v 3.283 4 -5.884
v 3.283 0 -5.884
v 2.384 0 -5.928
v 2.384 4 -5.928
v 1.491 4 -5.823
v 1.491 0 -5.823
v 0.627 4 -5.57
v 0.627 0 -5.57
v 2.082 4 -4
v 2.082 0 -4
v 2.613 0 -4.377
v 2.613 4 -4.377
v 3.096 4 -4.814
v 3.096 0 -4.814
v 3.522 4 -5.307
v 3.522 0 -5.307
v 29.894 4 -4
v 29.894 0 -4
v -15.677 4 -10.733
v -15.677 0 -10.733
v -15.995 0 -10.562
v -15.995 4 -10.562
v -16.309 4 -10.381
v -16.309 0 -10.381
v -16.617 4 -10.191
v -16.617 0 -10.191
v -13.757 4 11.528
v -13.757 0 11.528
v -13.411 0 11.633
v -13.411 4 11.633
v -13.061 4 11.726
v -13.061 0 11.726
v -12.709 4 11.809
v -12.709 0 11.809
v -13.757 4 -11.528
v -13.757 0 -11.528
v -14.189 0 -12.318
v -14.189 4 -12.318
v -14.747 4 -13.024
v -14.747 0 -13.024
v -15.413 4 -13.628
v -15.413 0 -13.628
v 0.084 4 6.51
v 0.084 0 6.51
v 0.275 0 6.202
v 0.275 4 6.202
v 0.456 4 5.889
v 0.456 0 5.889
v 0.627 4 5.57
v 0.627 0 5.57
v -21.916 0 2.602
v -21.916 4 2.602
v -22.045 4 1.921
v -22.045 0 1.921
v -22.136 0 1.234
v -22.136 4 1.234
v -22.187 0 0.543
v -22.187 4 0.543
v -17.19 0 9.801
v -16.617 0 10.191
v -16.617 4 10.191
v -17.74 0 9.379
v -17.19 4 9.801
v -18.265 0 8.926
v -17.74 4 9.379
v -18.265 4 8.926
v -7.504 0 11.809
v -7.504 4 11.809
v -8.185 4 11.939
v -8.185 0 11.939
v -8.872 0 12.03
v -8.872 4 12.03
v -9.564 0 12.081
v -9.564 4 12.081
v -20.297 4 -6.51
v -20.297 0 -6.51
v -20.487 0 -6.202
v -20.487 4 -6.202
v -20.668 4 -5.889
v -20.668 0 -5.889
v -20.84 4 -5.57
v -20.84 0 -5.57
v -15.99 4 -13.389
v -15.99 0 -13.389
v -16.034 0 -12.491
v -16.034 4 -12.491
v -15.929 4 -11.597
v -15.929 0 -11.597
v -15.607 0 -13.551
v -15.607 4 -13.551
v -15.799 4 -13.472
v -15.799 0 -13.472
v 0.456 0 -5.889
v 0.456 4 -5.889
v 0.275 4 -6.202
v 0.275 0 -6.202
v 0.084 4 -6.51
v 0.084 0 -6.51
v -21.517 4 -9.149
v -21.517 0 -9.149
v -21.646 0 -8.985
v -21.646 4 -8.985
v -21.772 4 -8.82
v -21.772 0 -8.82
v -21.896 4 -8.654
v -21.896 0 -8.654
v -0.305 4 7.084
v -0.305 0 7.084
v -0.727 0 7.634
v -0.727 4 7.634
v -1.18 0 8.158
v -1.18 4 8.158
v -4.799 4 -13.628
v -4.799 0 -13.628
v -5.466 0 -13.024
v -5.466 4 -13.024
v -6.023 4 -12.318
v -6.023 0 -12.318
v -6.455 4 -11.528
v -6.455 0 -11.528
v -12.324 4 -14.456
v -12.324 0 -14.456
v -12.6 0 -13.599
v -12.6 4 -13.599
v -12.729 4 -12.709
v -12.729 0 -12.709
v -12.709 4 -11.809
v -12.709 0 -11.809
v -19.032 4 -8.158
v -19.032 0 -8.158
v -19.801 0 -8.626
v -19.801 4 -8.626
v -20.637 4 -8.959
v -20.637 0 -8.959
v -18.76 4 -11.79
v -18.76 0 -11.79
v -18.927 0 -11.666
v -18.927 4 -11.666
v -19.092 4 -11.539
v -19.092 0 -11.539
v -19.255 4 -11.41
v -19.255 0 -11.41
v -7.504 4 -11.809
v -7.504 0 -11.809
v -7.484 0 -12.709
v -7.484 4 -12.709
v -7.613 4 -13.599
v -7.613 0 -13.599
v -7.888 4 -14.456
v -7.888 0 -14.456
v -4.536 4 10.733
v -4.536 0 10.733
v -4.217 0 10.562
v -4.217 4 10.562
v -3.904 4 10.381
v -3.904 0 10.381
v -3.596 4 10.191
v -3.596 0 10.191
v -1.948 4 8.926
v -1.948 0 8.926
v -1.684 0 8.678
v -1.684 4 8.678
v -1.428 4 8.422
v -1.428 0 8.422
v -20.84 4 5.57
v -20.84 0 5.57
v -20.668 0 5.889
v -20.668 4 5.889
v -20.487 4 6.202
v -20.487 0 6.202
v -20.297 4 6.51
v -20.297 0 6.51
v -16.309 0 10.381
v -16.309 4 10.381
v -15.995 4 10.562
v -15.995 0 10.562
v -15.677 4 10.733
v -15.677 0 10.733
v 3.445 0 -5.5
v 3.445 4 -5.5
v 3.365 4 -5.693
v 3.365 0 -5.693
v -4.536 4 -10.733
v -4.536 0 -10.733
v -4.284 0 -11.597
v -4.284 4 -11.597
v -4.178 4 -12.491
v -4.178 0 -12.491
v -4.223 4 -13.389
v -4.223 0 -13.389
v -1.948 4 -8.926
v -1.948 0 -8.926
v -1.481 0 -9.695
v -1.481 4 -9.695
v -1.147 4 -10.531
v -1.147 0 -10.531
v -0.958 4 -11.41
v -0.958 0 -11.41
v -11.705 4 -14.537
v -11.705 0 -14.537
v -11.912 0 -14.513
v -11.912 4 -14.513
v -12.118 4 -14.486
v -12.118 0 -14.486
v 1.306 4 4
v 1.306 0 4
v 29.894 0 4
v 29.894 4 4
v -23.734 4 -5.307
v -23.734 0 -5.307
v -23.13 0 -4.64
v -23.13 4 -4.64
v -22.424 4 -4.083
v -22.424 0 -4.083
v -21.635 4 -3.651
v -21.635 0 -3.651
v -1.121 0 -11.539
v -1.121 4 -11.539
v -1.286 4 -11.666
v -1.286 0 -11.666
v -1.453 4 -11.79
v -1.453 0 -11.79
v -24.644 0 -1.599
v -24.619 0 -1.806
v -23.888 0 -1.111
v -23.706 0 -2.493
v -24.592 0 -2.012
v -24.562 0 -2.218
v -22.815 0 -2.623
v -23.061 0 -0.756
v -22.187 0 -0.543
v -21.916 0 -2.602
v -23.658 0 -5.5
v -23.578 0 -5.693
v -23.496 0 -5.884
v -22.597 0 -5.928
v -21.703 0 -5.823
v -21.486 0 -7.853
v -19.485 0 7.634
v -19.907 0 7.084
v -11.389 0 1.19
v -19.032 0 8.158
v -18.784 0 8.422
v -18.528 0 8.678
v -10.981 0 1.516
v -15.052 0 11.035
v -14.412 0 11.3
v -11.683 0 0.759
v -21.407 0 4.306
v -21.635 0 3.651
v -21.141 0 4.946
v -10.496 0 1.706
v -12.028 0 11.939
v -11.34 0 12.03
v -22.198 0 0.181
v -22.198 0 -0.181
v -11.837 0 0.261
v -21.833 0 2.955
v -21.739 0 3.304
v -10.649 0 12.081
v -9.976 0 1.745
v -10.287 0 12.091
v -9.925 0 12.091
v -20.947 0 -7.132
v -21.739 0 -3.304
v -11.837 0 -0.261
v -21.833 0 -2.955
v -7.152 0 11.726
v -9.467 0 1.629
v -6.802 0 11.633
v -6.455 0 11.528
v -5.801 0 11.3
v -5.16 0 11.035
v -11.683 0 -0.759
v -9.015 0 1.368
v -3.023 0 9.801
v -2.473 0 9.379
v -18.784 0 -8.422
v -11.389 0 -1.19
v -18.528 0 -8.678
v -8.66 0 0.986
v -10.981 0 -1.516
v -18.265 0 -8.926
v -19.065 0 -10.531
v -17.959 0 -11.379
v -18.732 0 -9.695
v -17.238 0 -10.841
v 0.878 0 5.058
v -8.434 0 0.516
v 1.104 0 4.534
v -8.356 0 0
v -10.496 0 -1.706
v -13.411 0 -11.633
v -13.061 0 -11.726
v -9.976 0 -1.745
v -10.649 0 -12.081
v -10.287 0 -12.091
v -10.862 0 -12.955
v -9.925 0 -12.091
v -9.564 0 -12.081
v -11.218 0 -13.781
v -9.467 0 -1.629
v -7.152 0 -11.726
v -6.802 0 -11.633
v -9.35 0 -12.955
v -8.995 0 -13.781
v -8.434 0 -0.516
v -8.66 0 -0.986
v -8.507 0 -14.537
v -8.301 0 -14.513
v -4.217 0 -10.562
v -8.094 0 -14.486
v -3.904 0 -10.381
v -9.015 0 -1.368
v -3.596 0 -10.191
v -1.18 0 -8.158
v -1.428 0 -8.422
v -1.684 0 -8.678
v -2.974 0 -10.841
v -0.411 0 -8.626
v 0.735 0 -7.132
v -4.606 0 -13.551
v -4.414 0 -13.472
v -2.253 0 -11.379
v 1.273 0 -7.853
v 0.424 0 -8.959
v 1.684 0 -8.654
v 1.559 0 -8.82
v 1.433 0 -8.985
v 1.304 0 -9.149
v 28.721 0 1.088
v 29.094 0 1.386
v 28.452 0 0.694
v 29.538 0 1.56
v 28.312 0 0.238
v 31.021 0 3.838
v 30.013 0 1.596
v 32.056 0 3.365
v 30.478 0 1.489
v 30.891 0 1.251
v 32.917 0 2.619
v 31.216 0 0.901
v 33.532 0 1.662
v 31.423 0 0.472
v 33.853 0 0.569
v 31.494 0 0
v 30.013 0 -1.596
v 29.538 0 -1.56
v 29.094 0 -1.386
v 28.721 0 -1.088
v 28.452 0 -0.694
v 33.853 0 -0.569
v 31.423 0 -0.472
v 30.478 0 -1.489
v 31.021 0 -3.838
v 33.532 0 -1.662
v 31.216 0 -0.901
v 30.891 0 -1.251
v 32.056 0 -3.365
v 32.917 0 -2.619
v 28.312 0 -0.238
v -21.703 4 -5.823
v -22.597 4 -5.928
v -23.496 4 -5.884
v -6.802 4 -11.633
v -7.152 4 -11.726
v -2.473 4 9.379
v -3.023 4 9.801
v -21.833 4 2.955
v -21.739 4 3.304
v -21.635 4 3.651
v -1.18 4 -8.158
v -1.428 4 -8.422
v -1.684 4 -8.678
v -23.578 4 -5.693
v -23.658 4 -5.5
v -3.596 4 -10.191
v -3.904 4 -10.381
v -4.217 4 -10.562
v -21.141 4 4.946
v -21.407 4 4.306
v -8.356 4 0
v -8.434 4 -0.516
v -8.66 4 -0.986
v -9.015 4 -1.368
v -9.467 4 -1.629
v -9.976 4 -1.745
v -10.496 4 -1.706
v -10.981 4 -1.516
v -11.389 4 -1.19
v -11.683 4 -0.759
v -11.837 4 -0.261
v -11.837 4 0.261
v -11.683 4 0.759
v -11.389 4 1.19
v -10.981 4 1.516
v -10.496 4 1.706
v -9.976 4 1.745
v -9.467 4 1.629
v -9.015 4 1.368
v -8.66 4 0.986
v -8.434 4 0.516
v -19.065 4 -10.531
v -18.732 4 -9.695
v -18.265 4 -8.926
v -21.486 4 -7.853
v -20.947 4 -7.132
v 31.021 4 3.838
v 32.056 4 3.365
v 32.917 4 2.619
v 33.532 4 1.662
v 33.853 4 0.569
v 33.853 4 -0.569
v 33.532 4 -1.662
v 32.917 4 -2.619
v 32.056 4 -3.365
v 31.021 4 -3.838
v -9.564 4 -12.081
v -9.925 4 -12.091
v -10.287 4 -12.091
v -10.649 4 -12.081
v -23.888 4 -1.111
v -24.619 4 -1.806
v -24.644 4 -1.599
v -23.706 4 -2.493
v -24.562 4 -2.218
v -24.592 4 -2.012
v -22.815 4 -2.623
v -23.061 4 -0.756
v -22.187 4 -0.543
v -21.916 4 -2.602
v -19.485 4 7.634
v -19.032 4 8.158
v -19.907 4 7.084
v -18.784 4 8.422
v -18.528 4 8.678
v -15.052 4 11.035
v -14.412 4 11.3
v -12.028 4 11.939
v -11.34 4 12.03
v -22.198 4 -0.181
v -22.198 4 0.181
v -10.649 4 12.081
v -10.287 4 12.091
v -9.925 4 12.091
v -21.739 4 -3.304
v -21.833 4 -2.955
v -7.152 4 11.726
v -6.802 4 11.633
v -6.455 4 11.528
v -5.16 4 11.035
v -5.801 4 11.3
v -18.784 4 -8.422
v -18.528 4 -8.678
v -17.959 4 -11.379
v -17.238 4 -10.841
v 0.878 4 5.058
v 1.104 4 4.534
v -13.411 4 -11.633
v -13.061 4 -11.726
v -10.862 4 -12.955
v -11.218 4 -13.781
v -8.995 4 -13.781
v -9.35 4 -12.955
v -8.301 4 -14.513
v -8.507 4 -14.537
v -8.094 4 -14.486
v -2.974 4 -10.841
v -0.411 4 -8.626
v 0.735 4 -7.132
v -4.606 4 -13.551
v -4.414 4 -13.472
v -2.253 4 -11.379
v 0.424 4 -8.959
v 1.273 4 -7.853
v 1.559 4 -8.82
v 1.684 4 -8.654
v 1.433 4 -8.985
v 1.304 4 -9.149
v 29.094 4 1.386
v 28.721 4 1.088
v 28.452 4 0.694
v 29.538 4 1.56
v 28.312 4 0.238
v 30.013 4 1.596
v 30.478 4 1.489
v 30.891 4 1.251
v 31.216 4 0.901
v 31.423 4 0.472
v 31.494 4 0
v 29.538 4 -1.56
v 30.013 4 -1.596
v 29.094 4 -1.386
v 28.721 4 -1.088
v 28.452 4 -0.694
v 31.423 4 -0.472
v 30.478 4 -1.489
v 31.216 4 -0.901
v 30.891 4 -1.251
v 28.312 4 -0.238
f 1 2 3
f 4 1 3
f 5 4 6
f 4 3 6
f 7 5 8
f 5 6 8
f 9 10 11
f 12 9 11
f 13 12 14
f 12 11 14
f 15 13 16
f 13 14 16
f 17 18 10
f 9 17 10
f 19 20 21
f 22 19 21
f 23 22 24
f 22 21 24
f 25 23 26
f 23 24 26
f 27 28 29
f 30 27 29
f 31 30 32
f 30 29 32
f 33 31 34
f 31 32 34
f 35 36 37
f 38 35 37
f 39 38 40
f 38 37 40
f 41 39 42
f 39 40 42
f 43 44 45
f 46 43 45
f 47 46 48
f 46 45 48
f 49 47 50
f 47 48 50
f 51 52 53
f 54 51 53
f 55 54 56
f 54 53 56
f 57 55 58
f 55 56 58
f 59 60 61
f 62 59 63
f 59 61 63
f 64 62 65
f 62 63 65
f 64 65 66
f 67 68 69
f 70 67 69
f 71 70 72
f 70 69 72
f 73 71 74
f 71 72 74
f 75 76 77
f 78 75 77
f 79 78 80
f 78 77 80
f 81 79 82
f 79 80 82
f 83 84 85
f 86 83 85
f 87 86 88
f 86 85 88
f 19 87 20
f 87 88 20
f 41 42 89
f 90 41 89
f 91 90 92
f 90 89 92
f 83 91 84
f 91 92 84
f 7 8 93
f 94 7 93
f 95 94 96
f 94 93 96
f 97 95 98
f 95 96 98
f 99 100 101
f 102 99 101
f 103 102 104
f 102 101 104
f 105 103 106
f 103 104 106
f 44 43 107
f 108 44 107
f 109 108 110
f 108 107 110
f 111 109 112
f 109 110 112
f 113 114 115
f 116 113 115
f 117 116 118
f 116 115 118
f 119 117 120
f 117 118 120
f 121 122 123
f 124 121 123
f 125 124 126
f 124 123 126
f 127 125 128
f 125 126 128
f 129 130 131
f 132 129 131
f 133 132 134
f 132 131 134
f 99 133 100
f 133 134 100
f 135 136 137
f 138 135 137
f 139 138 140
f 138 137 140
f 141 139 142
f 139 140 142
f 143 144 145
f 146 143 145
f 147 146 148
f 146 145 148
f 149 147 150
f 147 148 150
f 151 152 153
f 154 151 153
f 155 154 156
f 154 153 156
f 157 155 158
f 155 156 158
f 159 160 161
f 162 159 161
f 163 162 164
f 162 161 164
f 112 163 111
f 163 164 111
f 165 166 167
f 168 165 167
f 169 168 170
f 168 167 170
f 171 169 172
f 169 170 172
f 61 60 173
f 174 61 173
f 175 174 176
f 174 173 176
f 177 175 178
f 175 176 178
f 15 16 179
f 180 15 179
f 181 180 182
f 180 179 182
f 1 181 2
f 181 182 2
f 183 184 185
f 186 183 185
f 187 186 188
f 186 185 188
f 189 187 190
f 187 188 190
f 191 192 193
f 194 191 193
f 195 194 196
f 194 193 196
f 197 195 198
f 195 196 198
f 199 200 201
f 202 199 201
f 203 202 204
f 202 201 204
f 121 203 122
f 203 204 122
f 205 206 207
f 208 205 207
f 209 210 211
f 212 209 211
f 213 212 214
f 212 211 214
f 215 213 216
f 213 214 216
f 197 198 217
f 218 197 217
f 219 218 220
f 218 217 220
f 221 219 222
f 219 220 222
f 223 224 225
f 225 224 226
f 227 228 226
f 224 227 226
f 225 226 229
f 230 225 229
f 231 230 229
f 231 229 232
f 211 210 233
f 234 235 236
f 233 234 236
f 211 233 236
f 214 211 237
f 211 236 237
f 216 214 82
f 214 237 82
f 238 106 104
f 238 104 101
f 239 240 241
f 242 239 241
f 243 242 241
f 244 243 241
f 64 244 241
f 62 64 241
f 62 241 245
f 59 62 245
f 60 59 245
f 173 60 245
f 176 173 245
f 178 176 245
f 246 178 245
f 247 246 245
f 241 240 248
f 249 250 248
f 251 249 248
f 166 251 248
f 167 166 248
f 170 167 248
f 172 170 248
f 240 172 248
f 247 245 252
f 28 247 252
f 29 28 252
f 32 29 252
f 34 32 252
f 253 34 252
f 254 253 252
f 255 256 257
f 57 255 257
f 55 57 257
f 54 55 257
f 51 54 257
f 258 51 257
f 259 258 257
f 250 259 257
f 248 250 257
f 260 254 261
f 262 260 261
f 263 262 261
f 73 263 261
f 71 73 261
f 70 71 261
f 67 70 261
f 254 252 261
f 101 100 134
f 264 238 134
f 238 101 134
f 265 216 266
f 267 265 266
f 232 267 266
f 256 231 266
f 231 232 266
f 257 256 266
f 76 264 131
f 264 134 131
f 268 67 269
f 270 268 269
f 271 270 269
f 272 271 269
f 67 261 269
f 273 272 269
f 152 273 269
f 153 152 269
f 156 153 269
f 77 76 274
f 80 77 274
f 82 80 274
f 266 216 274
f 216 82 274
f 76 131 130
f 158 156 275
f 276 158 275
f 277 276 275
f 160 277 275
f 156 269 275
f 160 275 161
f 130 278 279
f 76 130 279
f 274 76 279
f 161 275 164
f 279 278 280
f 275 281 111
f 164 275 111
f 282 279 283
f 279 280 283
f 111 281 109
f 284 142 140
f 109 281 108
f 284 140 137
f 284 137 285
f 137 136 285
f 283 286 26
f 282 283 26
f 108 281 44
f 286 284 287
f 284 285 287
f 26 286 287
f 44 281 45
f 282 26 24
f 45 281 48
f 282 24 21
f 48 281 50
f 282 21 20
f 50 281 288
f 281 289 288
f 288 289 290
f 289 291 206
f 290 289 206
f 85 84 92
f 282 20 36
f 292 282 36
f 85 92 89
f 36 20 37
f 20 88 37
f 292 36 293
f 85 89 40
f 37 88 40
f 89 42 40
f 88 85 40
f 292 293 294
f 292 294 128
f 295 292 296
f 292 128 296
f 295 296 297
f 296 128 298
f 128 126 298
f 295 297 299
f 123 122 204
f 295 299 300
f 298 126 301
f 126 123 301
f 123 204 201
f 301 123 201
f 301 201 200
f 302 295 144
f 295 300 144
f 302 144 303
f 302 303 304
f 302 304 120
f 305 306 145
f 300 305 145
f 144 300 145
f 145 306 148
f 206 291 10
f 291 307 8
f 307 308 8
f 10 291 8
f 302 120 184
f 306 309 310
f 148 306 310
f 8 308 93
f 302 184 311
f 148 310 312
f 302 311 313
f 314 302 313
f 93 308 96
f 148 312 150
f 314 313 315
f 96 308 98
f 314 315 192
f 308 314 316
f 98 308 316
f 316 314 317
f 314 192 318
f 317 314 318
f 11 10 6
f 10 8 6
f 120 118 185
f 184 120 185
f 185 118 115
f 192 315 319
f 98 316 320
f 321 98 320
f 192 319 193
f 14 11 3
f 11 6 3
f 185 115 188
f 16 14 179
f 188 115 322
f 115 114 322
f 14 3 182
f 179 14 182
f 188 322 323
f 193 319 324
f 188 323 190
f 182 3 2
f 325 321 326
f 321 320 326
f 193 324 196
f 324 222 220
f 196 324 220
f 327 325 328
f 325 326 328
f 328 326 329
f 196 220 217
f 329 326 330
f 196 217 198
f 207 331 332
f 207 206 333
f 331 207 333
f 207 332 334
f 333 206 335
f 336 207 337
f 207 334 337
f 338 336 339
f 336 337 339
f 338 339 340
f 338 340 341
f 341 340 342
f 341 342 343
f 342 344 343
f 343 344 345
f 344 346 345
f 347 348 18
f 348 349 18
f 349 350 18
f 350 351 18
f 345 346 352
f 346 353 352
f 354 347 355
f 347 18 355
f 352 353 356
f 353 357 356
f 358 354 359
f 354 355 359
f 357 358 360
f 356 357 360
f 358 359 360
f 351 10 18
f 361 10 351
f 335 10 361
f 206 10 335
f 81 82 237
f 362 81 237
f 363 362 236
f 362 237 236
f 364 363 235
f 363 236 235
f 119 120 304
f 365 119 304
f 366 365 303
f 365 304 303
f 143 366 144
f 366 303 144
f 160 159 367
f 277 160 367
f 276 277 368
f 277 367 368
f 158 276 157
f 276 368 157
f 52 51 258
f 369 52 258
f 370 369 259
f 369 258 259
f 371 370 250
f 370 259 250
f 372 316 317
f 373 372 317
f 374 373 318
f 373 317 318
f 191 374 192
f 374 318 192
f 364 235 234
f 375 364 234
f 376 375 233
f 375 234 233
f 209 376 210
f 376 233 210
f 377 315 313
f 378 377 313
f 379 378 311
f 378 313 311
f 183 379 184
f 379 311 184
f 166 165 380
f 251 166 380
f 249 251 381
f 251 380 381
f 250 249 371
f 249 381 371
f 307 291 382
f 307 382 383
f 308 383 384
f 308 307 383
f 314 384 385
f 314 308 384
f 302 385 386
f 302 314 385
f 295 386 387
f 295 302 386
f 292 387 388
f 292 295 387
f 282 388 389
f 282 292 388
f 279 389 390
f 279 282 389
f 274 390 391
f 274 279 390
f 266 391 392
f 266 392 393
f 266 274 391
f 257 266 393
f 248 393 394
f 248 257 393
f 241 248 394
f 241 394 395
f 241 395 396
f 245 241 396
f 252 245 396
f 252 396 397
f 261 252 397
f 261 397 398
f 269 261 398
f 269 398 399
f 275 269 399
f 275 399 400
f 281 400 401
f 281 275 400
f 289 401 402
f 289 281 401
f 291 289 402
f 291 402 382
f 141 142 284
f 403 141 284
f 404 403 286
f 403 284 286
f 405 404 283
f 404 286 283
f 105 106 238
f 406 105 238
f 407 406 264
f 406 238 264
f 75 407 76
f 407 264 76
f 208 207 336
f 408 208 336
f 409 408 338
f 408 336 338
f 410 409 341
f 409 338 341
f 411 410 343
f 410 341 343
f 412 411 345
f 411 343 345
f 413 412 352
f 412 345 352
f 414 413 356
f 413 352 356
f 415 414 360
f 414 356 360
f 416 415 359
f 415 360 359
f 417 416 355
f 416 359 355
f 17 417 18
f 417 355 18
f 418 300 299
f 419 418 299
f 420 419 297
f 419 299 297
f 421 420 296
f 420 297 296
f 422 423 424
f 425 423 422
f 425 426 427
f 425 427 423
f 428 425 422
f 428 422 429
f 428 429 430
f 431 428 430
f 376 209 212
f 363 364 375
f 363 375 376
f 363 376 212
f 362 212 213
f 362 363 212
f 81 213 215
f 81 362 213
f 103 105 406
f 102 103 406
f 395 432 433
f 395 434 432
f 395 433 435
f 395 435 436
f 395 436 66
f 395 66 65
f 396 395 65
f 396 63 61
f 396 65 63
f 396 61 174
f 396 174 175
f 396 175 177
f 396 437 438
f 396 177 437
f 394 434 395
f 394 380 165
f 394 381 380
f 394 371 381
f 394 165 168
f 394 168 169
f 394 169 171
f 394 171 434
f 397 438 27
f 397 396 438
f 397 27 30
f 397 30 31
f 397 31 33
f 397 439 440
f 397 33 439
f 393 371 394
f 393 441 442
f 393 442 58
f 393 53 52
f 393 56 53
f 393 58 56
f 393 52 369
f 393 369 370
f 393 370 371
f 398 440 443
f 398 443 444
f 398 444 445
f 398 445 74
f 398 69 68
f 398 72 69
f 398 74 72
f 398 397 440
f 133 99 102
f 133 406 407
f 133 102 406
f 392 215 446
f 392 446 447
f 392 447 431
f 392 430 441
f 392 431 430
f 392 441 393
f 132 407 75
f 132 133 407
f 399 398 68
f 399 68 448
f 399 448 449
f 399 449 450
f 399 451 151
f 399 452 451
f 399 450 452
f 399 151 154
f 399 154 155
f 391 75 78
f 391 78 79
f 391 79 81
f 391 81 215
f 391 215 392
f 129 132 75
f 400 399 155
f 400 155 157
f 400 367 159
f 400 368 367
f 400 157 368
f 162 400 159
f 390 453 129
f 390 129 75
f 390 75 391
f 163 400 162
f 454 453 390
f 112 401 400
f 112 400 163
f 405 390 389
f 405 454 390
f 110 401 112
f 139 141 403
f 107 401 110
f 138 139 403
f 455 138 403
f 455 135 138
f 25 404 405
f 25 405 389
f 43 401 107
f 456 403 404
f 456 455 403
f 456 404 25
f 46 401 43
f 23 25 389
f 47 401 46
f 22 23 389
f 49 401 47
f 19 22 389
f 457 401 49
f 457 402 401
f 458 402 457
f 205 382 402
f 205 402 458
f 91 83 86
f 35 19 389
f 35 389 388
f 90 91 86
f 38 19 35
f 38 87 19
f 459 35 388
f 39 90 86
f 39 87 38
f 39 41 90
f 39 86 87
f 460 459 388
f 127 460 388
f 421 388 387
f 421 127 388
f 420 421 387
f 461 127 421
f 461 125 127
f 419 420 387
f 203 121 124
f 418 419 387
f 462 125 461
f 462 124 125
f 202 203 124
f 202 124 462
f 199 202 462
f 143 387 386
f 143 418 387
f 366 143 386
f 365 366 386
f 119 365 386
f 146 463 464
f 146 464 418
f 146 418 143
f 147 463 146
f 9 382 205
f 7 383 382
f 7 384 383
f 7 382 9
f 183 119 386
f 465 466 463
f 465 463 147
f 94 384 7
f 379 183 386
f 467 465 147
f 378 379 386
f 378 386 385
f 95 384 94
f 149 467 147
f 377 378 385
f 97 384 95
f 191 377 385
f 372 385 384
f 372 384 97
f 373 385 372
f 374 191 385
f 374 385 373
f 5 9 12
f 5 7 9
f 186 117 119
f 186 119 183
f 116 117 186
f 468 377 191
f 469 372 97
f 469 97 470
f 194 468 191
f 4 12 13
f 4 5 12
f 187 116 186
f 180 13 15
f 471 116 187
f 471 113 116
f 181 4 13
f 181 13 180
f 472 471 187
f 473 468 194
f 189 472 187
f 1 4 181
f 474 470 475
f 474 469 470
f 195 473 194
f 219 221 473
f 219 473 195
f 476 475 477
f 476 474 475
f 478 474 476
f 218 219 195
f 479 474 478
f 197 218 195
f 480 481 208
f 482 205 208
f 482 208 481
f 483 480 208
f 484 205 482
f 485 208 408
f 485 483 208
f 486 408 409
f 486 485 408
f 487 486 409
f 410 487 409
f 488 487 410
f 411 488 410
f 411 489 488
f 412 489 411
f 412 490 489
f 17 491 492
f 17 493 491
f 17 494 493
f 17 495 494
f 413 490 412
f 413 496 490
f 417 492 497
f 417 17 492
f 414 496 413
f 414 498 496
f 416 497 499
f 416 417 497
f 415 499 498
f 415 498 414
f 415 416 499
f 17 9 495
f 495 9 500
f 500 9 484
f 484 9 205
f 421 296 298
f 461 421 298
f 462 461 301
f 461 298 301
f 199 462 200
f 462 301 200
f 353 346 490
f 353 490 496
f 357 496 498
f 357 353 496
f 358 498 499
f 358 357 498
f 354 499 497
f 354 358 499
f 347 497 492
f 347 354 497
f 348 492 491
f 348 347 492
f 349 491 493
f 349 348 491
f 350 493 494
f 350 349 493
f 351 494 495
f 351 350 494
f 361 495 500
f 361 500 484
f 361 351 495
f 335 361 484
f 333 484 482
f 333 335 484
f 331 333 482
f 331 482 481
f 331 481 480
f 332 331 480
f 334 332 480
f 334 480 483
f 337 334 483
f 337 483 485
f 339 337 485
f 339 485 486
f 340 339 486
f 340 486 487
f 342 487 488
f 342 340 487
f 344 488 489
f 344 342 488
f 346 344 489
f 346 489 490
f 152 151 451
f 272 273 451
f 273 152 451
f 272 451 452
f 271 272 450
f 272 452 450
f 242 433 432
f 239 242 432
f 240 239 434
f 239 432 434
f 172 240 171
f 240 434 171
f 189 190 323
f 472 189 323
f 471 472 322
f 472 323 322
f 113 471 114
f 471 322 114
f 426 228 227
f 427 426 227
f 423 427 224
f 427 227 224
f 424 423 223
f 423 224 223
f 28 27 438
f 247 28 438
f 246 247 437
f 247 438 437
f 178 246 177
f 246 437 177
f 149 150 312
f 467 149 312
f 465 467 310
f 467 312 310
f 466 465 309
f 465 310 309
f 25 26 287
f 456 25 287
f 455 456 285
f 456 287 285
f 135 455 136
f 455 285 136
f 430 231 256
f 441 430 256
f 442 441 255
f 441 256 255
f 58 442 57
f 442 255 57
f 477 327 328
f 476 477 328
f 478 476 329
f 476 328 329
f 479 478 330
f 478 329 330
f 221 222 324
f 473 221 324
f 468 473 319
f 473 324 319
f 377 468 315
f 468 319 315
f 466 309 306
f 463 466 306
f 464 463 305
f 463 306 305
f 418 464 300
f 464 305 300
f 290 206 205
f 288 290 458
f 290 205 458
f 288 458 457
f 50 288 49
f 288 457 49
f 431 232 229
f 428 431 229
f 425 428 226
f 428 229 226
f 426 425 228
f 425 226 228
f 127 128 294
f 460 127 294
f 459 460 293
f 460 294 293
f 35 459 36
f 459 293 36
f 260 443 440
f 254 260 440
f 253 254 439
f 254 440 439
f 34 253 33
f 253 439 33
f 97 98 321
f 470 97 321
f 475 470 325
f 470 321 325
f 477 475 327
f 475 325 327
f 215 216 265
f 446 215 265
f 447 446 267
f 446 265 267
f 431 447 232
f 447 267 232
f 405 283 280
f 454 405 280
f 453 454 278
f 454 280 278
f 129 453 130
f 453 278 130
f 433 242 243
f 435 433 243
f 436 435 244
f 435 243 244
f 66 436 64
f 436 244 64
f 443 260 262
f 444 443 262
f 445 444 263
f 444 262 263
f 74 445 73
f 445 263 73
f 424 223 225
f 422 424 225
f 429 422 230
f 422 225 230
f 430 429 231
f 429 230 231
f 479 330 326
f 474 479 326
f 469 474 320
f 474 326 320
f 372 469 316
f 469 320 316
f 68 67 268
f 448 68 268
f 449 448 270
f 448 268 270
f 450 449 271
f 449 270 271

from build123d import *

# Parameters (mm, degrees)
SKETCH1_R           = 1.75
SKETCH1_R_2         = 1.6
BOSS_EXTRUDE1_DEPTH = 4
CUT_EXTRUDE1_DEPTH  = 10


with BuildPart() as part:
    # Sketch1 → Boss-Extrude1 (new body)
    with BuildSketch(Plane(origin=(0, 0, 0), x_dir=(1, 0, 0), z_dir=(0, 1, 0))):
        with BuildLine():
            Line((29.893657446, 4), (2.081641936, 4))
            ThreePointArc((2.081641936, 4), (2.861028333, 4.588201733), (3.521749436, 5.30713988))
            ThreePointArc((3.521749436, 5.30713988), (3.405395609, 5.596745198), (3.282888305, 5.883801663))
            ThreePointArc((3.282888305, 5.883801663), (1.93527598, 5.894040025), (0.627094961, 5.57027124))
            ThreePointArc((0.627094961, 5.57027124), (0.366286148, 6.046375), (0.084372603, 6.510293938))
            ThreePointArc((0.084372603, 6.510293938), (1.018855105, 7.48132754), (1.683794586, 8.65351323))
            ThreePointArc((1.683794586, 8.65351323), (1.496450048, 8.903135899), (1.303821399, 9.148703928))
            ThreePointArc((1.303821399, 9.148703928), (-0.000522033, 8.809805691), (-1.180330337, 8.158486898))
            ThreePointArc((-1.180330337, 8.158486898), (-1.555477026, 8.550865528), (-1.947855656, 8.926012217))
            ThreePointArc((-1.947855656, 8.926012217), (-1.296536862, 10.105820521), (-0.957638625, 11.410163953))
            ThreePointArc((-0.957638625, 11.410163953), (-1.203206655, 11.602792602), (-1.452829324, 11.79013714))
            ThreePointArc((-1.452829324, 11.79013714), (-2.625015014, 11.125197659), (-3.596048616, 10.190715157))
            ThreePointArc((-3.596048616, 10.190715157), (-4.059967554, 10.472628702), (-4.536071314, 10.733437515))
            ThreePointArc((-4.536071314, 10.733437515), (-4.212302529, 12.041618533), (-4.222540891, 13.389230859))
            ThreePointArc((-4.222540891, 13.389230859), (-4.509597355, 13.511738163), (-4.799202674, 13.62809199))
            ThreePointArc((-4.799202674, 13.62809199), (-5.759348103, 12.682425791), (-6.455432668, 11.528463019))
            ThreePointArc((-6.455432668, 11.528463019), (-6.976508546, 11.680699536), (-7.503891752, 11.809396783))
            ThreePointArc((-7.503891752, 11.809396783), (-7.529737283, 13.156800143), (-7.888414517, 14.455843809))
            ThreePointArc((-7.888414517, 14.455843809), (-8.197396993, 14.499881098), (-8.507248835, 14.537314892))
            ThreePointArc((-8.507248835, 14.537314892), (-9.18992168, 13.375367565), (-9.563620196, 12.080565177))
            ThreePointArc((-9.563620196, 12.080565177), (-10.106342554, 12.09275), (-10.649064912, 12.080565177))
            ThreePointArc((-10.649064912, 12.080565177), (-11.022763428, 13.375367565), (-11.705436272, 14.537314892))
            ThreePointArc((-11.705436272, 14.537314892), (-12.015288115, 14.499881098), (-12.324270591, 14.455843809))
            ThreePointArc((-12.324270591, 14.455843809), (-12.682947825, 13.156800143), (-12.708793355, 11.809396783))
            ThreePointArc((-12.708793355, 11.809396783), (-13.236176561, 11.680699536), (-13.757252439, 11.528463019))
            ThreePointArc((-13.757252439, 11.528463019), (-14.453337005, 12.682425791), (-15.413482434, 13.62809199))
            ThreePointArc((-15.413482434, 13.62809199), (-15.703087752, 13.511738163), (-15.990144217, 13.389230859))
            ThreePointArc((-15.990144217, 13.389230859), (-16.000382579, 12.041618533), (-15.676613793, 10.733437515))
            ThreePointArc((-15.676613793, 10.733437515), (-16.152717554, 10.472628702), (-16.616636492, 10.190715157))
            ThreePointArc((-16.616636492, 10.190715157), (-17.587670094, 11.125197659), (-18.759855783, 11.79013714))
            ThreePointArc((-18.759855783, 11.79013714), (-19.009478453, 11.602792602), (-19.255046482, 11.410163953))
            ThreePointArc((-19.255046482, 11.410163953), (-18.916148245, 10.105820521), (-18.264829452, 8.926012217))
            ThreePointArc((-18.264829452, 8.926012217), (-18.657208082, 8.550865528), (-19.032354771, 8.158486898))
            ThreePointArc((-19.032354771, 8.158486898), (-20.212163074, 8.809805691), (-21.516506507, 9.148703928))
            ThreePointArc((-21.516506507, 9.148703928), (-21.709135156, 8.903135899), (-21.896479694, 8.65351323))
            ThreePointArc((-21.896479694, 8.65351323), (-21.231540213, 7.48132754), (-20.297057711, 6.510293938))
            ThreePointArc((-20.297057711, 6.510293938), (-20.578971255, 6.046375), (-20.839780068, 5.57027124))
            ThreePointArc((-20.839780068, 5.57027124), (-22.147961087, 5.894040025), (-23.495573413, 5.883801663))
            ThreePointArc((-23.495573413, 5.883801663), (-23.618080717, 5.596745198), (-23.734434544, 5.30713988))
            ThreePointArc((-23.734434544, 5.30713988), (-22.788768345, 4.346994451), (-21.634805572, 3.650909885))
            ThreePointArc((-21.634805572, 3.650909885), (-21.78704209, 3.129834008), (-21.915739337, 2.602450802))
            ThreePointArc((-21.915739337, 2.602450802), (-23.263142697, 2.576605271), (-24.562186363, 2.217928037))
            ThreePointArc((-24.562186363, 2.217928037), (-24.606223651, 1.908945561), (-24.643657446, 1.599093719))
            ThreePointArc((-24.643657446, 1.599093719), (-23.481710119, 0.916420874), (-22.186907731, 0.542722358))
            ThreePointArc((-22.186907731, 0.542722358), (-22.199092554, 0), (-22.186907731, -0.542722358))
            ThreePointArc((-22.186907731, -0.542722358), (-23.481710119, -0.916420874), (-24.643657446, -1.599093719))
            ThreePointArc((-24.643657446, -1.599093719), (-24.606223651, -1.908945561), (-24.562186363, -2.217928037))
            ThreePointArc((-24.562186363, -2.217928037), (-23.263142697, -2.576605271), (-21.915739337, -2.602450802))
            ThreePointArc((-21.915739337, -2.602450802), (-21.78704209, -3.129834008), (-21.634805572, -3.650909885))
            ThreePointArc((-21.634805572, -3.650909885), (-22.788768345, -4.346994451), (-23.734434544, -5.30713988))
            ThreePointArc((-23.734434544, -5.30713988), (-23.618080717, -5.596745198), (-23.495573413, -5.883801663))
            ThreePointArc((-23.495573413, -5.883801663), (-22.147961087, -5.894040025), (-20.839780068, -5.57027124))
            ThreePointArc((-20.839780068, -5.57027124), (-20.578971255, -6.046375), (-20.297057711, -6.510293938))
            ThreePointArc((-20.297057711, -6.510293938), (-21.231540213, -7.48132754), (-21.896479694, -8.65351323))
            ThreePointArc((-21.896479694, -8.65351323), (-21.709135156, -8.903135899), (-21.516506507, -9.148703928))
            ThreePointArc((-21.516506507, -9.148703928), (-20.212163074, -8.809805691), (-19.032354771, -8.158486898))
            ThreePointArc((-19.032354771, -8.158486898), (-18.657208082, -8.550865528), (-18.264829452, -8.926012217))
            ThreePointArc((-18.264829452, -8.926012217), (-18.916148245, -10.105820521), (-19.255046482, -11.410163953))
            ThreePointArc((-19.255046482, -11.410163953), (-19.009478453, -11.602792602), (-18.759855783, -11.79013714))
            ThreePointArc((-18.759855783, -11.79013714), (-17.587670094, -11.125197659), (-16.616636492, -10.190715157))
            ThreePointArc((-16.616636492, -10.190715157), (-16.152717554, -10.472628702), (-15.676613793, -10.733437515))
            ThreePointArc((-15.676613793, -10.733437515), (-16.000382579, -12.041618533), (-15.990144217, -13.389230859))
            ThreePointArc((-15.990144217, -13.389230859), (-15.703087752, -13.511738163), (-15.413482434, -13.62809199))
            ThreePointArc((-15.413482434, -13.62809199), (-14.453337005, -12.682425791), (-13.757252439, -11.528463019))
            ThreePointArc((-13.757252439, -11.528463019), (-13.236176561, -11.680699536), (-12.708793355, -11.809396783))
            ThreePointArc((-12.708793355, -11.809396783), (-12.682947825, -13.156800143), (-12.324270591, -14.455843809))
            ThreePointArc((-12.324270591, -14.455843809), (-12.015288115, -14.499881098), (-11.705436272, -14.537314892))
            ThreePointArc((-11.705436272, -14.537314892), (-11.022763428, -13.375367565), (-10.649064912, -12.080565177))
            ThreePointArc((-10.649064912, -12.080565177), (-10.106342554, -12.09275), (-9.563620196, -12.080565177))
            ThreePointArc((-9.563620196, -12.080565177), (-9.18992168, -13.375367565), (-8.507248835, -14.537314892))
            ThreePointArc((-8.507248835, -14.537314892), (-8.197396993, -14.499881098), (-7.888414517, -14.455843809))
            ThreePointArc((-7.888414517, -14.455843809), (-7.529737283, -13.156800143), (-7.503891752, -11.809396783))
            ThreePointArc((-7.503891752, -11.809396783), (-6.976508546, -11.680699536), (-6.455432668, -11.528463019))
            ThreePointArc((-6.455432668, -11.528463019), (-5.759348103, -12.682425791), (-4.799202674, -13.62809199))
            ThreePointArc((-4.799202674, -13.62809199), (-4.509597355, -13.511738163), (-4.222540891, -13.389230859))
            ThreePointArc((-4.222540891, -13.389230859), (-4.212302529, -12.041618533), (-4.536071314, -10.733437515))
            ThreePointArc((-4.536071314, -10.733437515), (-4.059967554, -10.472628702), (-3.596048616, -10.190715157))
            ThreePointArc((-3.596048616, -10.190715157), (-2.625015014, -11.125197659), (-1.452829324, -11.79013714))
            ThreePointArc((-1.452829324, -11.79013714), (-1.203206655, -11.602792602), (-0.957638625, -11.410163953))
            ThreePointArc((-0.957638625, -11.410163953), (-1.296536862, -10.105820521), (-1.947855656, -8.926012217))
            ThreePointArc((-1.947855656, -8.926012217), (-1.555477026, -8.550865528), (-1.180330337, -8.158486898))
            ThreePointArc((-1.180330337, -8.158486898), (-0.000522033, -8.809805691), (1.303821399, -9.148703928))
            ThreePointArc((1.303821399, -9.148703928), (1.496450048, -8.903135899), (1.683794586, -8.65351323))
            ThreePointArc((1.683794586, -8.65351323), (1.018855105, -7.48132754), (0.084372603, -6.510293938))
            ThreePointArc((0.084372603, -6.510293938), (0.366286148, -6.046375), (0.627094961, -5.57027124))
            ThreePointArc((0.627094961, -5.57027124), (1.93527598, -5.894040025), (3.282888305, -5.883801663))
            ThreePointArc((3.282888305, -5.883801663), (3.405395609, -5.596745198), (3.521749436, -5.30713988))
            ThreePointArc((3.521749436, -5.30713988), (2.861028333, -4.588201733), (2.081641936, -4))
            Line((2.081641936, -4), (29.893657446, -4))
            ThreePointArc((29.893657446, -4), (33.893657446, 0), (29.893657446, 4))
        make_face()
        with Locations((-10.106342554, 0)):
            Circle(SKETCH1_R, mode=Mode.SUBTRACT)
        with Locations((29.893657446, 0)):
            Circle(SKETCH1_R_2, mode=Mode.SUBTRACT)
    extrude(amount=BOSS_EXTRUDE1_DEPTH)

    # Sketch2 → Cut-Extrude1 (cut)
    with BuildSketch(Plane(origin=(0, 4, 0), x_dir=(1, 0, 0), z_dir=(0, 1, 0))):
        with BuildLine():
            ThreePointArc((-24.562186363, -2.217928037), (-23.263142697, -2.576605271), (-21.915739337, -2.602450802))
            ThreePointArc((-21.915739337, -2.602450802), (-22.095637401, -1.578420611), (-22.186907731, -0.542722358))
            ThreePointArc((-22.186907731, -0.542722358), (-23.481710119, -0.916420874), (-24.643657446, -1.599093719))
            ThreePointArc((-24.643657446, -1.599093719), (-24.606223651, -1.908945561), (-24.562186363, -2.217928037))
        make_face()
        with BuildLine():
            ThreePointArc((-23.495573413, -5.883801663), (-22.147961087, -5.894040025), (-20.839780068, -5.57027124))
            ThreePointArc((-20.839780068, -5.57027124), (-21.278586771, -4.627695077), (-21.634805572, -3.650909885))
            ThreePointArc((-21.634805572, -3.650909885), (-22.788768345, -4.346994451), (-23.734434544, -5.30713988))
            ThreePointArc((-23.734434544, -5.30713988), (-23.618080717, -5.596745198), (-23.495573413, -5.883801663))
        make_face()
        with BuildLine():
            ThreePointArc((-21.516506507, -9.148703928), (-20.212163074, -8.809805691), (-19.032354771, -8.158486898))
            ThreePointArc((-19.032354771, -8.158486898), (-19.70016616, -7.361599771), (-20.297057711, -6.510293938))
            ThreePointArc((-20.297057711, -6.510293938), (-21.231540213, -7.48132754), (-21.896479694, -8.65351323))
            ThreePointArc((-21.896479694, -8.65351323), (-21.709135156, -8.903135899), (-21.516506507, -9.148703928))
        make_face()
        with BuildLine():
            ThreePointArc((-18.759855783, -11.79013714), (-17.587670094, -11.125197659), (-16.616636492, -10.190715157))
            ThreePointArc((-16.616636492, -10.190715157), (-17.467942324, -9.593823606), (-18.264829452, -8.926012217))
            ThreePointArc((-18.264829452, -8.926012217), (-18.916148245, -10.105820521), (-19.255046482, -11.410163953))
            ThreePointArc((-19.255046482, -11.410163953), (-19.009478453, -11.602792602), (-18.759855783, -11.79013714))
        make_face()
        with BuildLine():
            ThreePointArc((-15.413482434, -13.62809199), (-14.453337005, -12.682425791), (-13.757252439, -11.528463019))
            ThreePointArc((-13.757252439, -11.528463019), (-14.734037631, -11.172244217), (-15.676613793, -10.733437515))
            ThreePointArc((-15.676613793, -10.733437515), (-16.000382579, -12.041618533), (-15.990144217, -13.389230859))
            ThreePointArc((-15.990144217, -13.389230859), (-15.703087752, -13.511738163), (-15.413482434, -13.62809199))
        make_face()
        with BuildLine():
            ThreePointArc((-11.705436272, -14.537314892), (-11.022763428, -13.375367565), (-10.649064912, -12.080565177))
            ThreePointArc((-10.649064912, -12.080565177), (-11.684763165, -11.989294847), (-12.708793355, -11.809396783))
            ThreePointArc((-12.708793355, -11.809396783), (-12.682947825, -13.156800143), (-12.324270591, -14.455843809))
            ThreePointArc((-12.324270591, -14.455843809), (-12.015288115, -14.499881098), (-11.705436272, -14.537314892))
        make_face()
        with BuildLine():
            ThreePointArc((-7.888414517, -14.455843809), (-7.529737283, -13.156800143), (-7.503891752, -11.809396783))
            ThreePointArc((-7.503891752, -11.809396783), (-8.527921943, -11.989294847), (-9.563620196, -12.080565177))
            ThreePointArc((-9.563620196, -12.080565177), (-9.18992168, -13.375367565), (-8.507248835, -14.537314892))
            ThreePointArc((-8.507248835, -14.537314892), (-8.197396993, -14.499881098), (-7.888414517, -14.455843809))
        make_face()
        with BuildLine():
            ThreePointArc((-4.222540891, -13.389230859), (-4.212302529, -12.041618533), (-4.536071314, -10.733437515))
            ThreePointArc((-4.536071314, -10.733437515), (-5.478647477, -11.172244217), (-6.455432668, -11.528463019))
            ThreePointArc((-6.455432668, -11.528463019), (-5.759348103, -12.682425791), (-4.799202674, -13.62809199))
            ThreePointArc((-4.799202674, -13.62809199), (-4.509597355, -13.511738163), (-4.222540891, -13.389230859))
        make_face()
        with BuildLine():
            ThreePointArc((-0.957638625, -11.410163953), (-1.296536862, -10.105820521), (-1.947855656, -8.926012217))
            ThreePointArc((-1.947855656, -8.926012217), (-2.744742783, -9.593823606), (-3.596048616, -10.190715157))
            ThreePointArc((-3.596048616, -10.190715157), (-2.625015014, -11.125197659), (-1.452829324, -11.79013714))
            ThreePointArc((-1.452829324, -11.79013714), (-1.203206655, -11.602792602), (-0.957638625, -11.410163953))
        make_face()
        with BuildLine():
            ThreePointArc((1.683794586, -8.65351323), (1.018855105, -7.48132754), (0.084372603, -6.510293938))
            ThreePointArc((0.084372603, -6.510293938), (-0.512518948, -7.361599771), (-1.180330337, -8.158486898))
            ThreePointArc((-1.180330337, -8.158486898), (-0.000522033, -8.809805691), (1.303821399, -9.148703928))
            ThreePointArc((1.303821399, -9.148703928), (1.496450048, -8.903135899), (1.683794586, -8.65351323))
        make_face()
        with BuildLine():
            ThreePointArc((3.521749436, -5.30713988), (2.861028333, -4.588201733), (2.081641936, -4))
            Line((2.081641936, -4), (1.305695063, -4))
            ThreePointArc((1.305695063, -4), (0.994195953, -4.797149927), (0.627094961, -5.57027124))
            ThreePointArc((0.627094961, -5.57027124), (1.93527598, -5.894040025), (3.282888305, -5.883801663))
            ThreePointArc((3.282888305, -5.883801663), (3.405395609, -5.596745198), (3.521749436, -5.30713988))
        make_face()
    extrude(amount=-CUT_EXTRUDE1_DEPTH, mode=Mode.SUBTRACT)


solid = part.part
